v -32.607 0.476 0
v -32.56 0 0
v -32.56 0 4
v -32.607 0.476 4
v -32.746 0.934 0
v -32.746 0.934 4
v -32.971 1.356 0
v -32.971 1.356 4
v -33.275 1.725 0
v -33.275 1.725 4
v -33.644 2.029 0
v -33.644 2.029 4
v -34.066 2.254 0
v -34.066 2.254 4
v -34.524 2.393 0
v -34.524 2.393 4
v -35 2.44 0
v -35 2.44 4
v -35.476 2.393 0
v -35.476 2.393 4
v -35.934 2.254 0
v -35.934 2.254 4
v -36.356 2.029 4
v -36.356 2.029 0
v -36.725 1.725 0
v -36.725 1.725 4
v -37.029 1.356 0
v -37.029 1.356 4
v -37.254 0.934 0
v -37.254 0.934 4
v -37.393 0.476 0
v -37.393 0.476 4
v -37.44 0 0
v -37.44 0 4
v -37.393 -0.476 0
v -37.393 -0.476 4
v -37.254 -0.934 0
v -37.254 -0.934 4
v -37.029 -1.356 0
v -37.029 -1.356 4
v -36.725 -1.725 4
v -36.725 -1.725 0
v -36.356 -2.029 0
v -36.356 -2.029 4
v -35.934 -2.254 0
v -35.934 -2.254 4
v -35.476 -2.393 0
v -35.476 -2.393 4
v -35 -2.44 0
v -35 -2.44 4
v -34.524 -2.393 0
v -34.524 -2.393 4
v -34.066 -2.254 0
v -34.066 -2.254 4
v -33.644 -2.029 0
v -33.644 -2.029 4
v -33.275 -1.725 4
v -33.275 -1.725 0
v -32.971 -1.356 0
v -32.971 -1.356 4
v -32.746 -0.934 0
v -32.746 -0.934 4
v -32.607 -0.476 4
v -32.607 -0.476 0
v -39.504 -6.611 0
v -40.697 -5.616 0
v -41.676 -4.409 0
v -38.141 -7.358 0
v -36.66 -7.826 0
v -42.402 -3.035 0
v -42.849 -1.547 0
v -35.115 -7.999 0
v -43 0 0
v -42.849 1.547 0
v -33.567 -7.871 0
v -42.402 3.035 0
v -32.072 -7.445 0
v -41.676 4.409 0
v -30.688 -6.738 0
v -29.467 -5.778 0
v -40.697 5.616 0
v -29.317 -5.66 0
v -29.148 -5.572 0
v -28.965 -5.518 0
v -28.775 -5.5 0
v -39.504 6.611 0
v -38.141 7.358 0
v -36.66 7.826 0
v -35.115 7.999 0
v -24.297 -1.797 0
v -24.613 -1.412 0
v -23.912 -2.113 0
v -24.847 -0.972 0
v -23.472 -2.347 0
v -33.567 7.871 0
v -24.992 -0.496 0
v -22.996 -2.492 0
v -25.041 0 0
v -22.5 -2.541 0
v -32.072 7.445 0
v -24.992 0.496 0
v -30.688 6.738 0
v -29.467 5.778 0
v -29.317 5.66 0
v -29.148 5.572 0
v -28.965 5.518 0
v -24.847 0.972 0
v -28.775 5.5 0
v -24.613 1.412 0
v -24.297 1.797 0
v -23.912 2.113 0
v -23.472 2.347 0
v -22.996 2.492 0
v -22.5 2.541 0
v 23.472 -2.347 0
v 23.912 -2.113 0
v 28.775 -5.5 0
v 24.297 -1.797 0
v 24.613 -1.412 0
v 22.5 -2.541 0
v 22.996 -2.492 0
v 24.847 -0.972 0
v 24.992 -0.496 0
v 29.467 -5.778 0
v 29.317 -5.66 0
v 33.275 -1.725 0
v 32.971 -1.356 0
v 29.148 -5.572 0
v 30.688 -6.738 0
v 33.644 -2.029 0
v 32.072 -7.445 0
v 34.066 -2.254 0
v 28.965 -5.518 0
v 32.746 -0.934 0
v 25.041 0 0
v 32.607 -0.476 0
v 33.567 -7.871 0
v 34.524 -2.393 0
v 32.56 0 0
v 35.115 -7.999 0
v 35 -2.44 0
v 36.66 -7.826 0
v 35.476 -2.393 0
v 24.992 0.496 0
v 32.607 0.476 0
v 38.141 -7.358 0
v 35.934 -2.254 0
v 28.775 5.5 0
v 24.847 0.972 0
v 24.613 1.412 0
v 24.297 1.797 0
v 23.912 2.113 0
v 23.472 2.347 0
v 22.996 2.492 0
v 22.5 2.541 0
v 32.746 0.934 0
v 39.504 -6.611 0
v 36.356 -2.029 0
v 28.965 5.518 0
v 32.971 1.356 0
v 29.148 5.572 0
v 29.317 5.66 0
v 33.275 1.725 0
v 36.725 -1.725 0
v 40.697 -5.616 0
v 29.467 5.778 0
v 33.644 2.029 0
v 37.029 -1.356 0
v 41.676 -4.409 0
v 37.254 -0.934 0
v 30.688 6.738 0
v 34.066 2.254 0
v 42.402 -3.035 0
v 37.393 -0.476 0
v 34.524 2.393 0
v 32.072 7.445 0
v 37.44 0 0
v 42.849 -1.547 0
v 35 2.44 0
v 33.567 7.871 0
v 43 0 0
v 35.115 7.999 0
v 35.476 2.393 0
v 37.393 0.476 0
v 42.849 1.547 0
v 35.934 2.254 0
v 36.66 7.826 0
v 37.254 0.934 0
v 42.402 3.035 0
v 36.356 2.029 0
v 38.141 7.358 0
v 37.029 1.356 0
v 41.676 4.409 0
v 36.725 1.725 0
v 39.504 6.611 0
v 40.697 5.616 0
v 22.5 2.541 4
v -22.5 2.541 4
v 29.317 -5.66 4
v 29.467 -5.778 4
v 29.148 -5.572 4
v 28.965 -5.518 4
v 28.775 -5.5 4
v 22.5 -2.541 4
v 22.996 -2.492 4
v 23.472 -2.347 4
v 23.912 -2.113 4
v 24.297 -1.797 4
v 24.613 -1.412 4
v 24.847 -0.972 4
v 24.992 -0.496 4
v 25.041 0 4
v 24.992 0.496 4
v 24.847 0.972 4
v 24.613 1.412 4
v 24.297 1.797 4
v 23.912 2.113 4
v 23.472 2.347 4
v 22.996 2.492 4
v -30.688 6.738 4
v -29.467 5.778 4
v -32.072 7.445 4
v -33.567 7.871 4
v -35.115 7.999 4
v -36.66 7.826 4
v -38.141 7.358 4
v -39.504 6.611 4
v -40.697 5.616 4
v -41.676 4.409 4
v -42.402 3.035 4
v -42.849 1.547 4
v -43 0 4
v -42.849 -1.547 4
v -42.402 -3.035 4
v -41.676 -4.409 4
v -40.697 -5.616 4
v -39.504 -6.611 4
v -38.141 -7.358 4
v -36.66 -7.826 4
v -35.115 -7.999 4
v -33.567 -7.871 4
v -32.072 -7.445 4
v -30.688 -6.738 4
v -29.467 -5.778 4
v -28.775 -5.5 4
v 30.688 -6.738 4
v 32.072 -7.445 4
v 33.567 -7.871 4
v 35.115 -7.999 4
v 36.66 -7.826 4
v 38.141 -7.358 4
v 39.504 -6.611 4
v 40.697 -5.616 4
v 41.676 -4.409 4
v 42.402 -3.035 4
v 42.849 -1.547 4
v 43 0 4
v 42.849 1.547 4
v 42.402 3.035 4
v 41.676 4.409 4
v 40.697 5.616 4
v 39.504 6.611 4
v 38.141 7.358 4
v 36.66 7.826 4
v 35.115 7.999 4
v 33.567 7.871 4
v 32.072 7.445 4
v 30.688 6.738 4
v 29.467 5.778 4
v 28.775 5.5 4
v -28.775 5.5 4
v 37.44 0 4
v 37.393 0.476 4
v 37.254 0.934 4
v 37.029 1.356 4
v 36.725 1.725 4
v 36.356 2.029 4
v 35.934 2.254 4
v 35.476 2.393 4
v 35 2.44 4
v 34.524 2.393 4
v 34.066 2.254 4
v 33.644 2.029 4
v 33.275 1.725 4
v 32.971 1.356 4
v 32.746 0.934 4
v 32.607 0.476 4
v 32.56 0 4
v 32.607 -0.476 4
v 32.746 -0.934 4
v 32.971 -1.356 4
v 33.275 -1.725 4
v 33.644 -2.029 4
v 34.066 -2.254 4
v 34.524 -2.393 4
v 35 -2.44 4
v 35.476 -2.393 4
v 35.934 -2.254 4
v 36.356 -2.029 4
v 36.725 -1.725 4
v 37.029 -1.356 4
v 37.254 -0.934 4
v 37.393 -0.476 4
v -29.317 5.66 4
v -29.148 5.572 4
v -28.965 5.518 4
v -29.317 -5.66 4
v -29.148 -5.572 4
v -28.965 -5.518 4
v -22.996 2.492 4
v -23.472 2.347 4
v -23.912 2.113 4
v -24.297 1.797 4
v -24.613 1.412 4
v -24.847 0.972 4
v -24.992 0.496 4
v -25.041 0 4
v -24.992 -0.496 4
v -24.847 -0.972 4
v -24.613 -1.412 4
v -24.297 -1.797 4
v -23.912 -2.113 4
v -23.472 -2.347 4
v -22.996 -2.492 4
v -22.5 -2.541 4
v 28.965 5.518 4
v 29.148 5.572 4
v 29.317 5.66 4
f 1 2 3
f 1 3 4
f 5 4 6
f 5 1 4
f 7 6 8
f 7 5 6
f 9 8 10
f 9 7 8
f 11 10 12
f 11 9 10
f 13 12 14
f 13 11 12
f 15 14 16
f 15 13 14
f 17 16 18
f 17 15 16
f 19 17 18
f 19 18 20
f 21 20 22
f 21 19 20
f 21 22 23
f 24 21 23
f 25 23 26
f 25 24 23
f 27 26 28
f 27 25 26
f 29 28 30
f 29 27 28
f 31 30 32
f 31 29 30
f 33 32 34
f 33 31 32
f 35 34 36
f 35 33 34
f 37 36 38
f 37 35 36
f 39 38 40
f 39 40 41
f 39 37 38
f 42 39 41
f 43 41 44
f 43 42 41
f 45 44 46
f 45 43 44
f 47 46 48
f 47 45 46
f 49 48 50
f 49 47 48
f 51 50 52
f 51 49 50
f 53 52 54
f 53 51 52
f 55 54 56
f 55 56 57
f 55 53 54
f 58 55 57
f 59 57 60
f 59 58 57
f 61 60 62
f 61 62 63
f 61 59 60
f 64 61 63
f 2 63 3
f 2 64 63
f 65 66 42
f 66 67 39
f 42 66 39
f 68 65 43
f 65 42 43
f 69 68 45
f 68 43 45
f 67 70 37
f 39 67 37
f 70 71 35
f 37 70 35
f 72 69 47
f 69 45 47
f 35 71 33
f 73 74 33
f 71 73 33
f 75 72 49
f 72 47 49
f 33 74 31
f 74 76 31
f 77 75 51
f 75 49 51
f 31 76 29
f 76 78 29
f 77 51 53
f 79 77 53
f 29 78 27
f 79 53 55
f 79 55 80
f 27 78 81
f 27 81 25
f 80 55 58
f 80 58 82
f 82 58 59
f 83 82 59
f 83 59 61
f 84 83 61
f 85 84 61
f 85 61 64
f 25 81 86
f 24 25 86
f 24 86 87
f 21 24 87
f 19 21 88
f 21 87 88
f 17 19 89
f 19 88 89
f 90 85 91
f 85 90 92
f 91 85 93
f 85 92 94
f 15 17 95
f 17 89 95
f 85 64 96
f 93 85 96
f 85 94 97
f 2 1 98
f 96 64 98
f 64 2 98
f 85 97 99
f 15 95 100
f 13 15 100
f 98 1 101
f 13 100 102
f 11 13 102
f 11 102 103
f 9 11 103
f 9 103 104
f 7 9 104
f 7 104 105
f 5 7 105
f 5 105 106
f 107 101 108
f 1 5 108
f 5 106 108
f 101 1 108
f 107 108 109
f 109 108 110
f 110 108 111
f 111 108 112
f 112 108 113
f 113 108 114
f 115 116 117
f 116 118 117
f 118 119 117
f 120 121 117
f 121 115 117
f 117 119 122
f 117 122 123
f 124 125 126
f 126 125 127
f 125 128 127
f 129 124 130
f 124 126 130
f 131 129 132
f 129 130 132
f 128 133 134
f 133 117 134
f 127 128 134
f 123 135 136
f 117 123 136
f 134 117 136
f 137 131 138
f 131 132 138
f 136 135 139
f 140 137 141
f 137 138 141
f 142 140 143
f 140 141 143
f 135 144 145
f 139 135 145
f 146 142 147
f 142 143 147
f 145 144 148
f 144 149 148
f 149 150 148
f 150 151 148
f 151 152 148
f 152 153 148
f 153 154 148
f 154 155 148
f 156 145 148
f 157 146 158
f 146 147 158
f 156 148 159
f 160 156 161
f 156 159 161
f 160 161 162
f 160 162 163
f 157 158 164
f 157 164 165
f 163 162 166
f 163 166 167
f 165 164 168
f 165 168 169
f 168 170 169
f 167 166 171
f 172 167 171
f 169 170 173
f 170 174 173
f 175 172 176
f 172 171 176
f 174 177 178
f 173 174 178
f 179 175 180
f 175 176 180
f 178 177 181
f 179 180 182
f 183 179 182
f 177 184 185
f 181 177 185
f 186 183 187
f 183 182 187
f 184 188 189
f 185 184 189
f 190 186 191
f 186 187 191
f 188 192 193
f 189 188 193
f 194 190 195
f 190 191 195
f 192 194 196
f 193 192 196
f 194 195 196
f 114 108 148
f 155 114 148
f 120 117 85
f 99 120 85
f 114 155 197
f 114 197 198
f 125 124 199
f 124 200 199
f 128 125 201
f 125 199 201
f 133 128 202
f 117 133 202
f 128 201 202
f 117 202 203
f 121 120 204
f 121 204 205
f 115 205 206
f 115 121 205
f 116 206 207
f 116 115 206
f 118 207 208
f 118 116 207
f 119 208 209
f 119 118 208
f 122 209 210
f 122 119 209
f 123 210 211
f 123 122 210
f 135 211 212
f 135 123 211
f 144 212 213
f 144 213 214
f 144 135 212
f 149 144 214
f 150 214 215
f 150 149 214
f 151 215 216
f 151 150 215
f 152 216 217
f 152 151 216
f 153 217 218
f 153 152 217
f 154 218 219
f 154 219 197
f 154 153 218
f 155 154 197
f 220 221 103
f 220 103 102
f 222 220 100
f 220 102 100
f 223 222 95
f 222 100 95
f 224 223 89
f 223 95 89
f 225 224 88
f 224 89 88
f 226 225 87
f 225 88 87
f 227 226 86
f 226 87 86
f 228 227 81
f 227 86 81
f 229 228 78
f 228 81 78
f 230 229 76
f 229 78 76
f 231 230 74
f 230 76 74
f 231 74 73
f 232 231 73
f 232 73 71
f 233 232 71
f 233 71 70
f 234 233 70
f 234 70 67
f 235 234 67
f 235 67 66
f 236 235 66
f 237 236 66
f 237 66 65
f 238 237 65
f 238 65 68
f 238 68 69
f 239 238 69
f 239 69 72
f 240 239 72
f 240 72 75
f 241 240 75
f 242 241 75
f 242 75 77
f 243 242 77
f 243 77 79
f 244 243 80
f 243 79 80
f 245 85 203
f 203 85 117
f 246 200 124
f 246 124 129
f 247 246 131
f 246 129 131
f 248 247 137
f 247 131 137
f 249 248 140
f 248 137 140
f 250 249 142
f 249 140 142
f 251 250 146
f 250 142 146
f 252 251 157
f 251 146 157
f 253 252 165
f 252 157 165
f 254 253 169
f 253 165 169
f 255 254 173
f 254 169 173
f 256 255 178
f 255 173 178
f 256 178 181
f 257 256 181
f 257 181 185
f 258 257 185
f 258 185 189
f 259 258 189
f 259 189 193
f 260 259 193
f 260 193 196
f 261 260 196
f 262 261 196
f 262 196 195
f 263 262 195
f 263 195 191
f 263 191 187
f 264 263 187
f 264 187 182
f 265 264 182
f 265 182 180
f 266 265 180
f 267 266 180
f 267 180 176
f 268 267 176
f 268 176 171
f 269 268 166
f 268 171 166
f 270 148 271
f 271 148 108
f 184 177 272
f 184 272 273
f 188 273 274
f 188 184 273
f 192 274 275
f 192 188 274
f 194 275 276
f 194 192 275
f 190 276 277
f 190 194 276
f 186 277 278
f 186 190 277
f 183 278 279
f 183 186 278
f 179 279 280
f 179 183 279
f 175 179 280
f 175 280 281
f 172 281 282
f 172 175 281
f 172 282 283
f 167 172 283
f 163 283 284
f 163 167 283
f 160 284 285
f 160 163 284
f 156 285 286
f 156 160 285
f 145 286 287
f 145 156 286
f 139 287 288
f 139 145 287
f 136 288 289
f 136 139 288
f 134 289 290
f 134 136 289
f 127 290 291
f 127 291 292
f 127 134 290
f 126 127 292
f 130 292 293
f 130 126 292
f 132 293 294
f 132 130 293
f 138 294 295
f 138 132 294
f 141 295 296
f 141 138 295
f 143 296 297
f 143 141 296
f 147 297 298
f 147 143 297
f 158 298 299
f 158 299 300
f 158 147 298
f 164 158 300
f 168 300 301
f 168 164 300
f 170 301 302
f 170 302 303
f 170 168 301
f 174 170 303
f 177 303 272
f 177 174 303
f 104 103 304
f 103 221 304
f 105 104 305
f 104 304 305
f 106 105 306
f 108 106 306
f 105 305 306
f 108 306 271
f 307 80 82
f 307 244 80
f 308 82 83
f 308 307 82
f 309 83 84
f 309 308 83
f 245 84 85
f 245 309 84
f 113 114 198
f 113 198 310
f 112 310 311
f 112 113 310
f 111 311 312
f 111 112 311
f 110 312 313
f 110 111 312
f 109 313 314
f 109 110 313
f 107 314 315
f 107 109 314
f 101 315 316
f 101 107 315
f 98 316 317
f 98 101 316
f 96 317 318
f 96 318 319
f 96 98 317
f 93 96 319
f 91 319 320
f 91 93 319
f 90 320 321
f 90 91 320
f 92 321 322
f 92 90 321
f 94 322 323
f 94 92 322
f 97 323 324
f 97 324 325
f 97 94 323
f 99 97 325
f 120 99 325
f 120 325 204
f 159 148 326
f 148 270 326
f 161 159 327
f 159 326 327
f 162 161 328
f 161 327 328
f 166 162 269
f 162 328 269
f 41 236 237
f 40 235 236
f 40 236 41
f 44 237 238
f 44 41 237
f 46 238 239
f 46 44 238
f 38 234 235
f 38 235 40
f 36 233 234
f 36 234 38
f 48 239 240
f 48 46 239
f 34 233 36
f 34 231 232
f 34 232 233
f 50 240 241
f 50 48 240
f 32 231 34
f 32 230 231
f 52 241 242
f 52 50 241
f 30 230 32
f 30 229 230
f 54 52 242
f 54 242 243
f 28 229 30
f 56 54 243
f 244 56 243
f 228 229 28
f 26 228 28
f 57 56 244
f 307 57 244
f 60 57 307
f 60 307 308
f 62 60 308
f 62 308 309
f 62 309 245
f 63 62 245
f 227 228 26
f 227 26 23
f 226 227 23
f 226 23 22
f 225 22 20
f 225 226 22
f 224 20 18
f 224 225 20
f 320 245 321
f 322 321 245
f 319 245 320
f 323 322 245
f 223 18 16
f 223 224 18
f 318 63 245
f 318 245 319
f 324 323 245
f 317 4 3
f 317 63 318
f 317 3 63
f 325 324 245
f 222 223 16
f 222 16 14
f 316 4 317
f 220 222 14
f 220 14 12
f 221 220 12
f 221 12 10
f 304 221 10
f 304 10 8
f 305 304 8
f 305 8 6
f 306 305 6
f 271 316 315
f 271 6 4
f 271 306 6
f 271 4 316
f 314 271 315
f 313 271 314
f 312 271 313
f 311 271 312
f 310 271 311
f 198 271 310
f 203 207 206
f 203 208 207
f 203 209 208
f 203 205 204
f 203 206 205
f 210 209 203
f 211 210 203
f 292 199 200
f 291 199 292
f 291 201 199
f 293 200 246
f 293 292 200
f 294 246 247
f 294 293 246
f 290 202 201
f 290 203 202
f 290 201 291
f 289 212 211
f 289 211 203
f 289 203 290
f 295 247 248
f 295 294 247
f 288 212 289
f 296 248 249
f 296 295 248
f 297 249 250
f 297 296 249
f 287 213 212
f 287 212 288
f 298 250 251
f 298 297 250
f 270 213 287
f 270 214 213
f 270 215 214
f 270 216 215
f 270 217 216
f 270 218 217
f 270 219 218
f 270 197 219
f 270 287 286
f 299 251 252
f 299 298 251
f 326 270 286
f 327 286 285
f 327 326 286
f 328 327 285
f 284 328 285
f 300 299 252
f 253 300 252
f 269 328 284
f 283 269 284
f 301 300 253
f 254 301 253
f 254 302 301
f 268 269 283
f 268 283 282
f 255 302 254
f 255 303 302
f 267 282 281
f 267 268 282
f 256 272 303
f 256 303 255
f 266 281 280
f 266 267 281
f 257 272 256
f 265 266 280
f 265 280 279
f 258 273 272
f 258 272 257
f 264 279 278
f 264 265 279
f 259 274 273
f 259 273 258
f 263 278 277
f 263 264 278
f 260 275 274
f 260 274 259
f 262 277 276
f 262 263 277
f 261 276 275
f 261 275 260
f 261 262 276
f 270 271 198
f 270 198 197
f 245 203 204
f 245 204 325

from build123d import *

# Parameters (mm, degrees)
SKETCH_1_R      = 2.44
EXTRUDE_1_DEPTH = 4
FILLET_2_R      = 1
FILLET_4_R      = 1
FILLET_5_R      = 1
FILLET_6_R      = 1


with BuildPart() as part:
    # 草图1 → 凸台-拉伸1 (new body)
    with BuildSketch(Plane.XY):
        with BuildLine():
            Line((-29.190524981, -5.5), (29.190524981, -5.5))
            ThreePointArc((29.190524981, -5.5), (43, 0), (29.190524981, 5.5))
            Line((29.190524981, 5.5), (-29.190524981, 5.5))
            ThreePointArc((-29.190524981, 5.5), (-43, 0), (-29.190524981, -5.5))
        make_face()
        with Locations((35, 0)):
            Circle(SKETCH_1_R, mode=Mode.SUBTRACT)
        with Locations((-35, 0)):
            Circle(SKETCH_1_R, mode=Mode.SUBTRACT)
        with BuildLine():
            ThreePointArc((22.5, -2.540734009), (25.040734009, 0), (22.5, 2.540734009))
            Line((22.5, 2.540734009), (-22.5, 2.540734009))
            ThreePointArc((-22.5, 2.540734009), (-25.040734009, 0), (-22.5, -2.540734009))
            Line((-22.5, -2.540734009), (22.5, -2.540734009))
        make_face(mode=Mode.SUBTRACT)
    extrude(amount=EXTRUDE_1_DEPTH)

    # 圆角2
    fillet_2_edges = [part.edges().sort_by_distance(p)[0] for p in [
        (-29.190524981, 5.5, 2),
    ]]
    fillet(fillet_2_edges, radius=FILLET_2_R)

    # 圆角4
    fillet_4_edges = [part.edges().sort_by_distance(p)[0] for p in [
        (-29.190524981, -5.5, 2),
    ]]
    fillet(fillet_4_edges, radius=FILLET_4_R)

    # 圆角5
    fillet_5_edges = [part.edges().sort_by_distance(p)[0] for p in [
        (29.190524981, 5.5, 2),
    ]]
    fillet(fillet_5_edges, radius=FILLET_5_R)

    # 圆角6
    fillet_6_edges = [part.edges().sort_by_distance(p)[0] for p in [
        (29.190524981, -5.5, 2),
    ]]
    fillet(fillet_6_edges, radius=FILLET_6_R)


solid = part.part
